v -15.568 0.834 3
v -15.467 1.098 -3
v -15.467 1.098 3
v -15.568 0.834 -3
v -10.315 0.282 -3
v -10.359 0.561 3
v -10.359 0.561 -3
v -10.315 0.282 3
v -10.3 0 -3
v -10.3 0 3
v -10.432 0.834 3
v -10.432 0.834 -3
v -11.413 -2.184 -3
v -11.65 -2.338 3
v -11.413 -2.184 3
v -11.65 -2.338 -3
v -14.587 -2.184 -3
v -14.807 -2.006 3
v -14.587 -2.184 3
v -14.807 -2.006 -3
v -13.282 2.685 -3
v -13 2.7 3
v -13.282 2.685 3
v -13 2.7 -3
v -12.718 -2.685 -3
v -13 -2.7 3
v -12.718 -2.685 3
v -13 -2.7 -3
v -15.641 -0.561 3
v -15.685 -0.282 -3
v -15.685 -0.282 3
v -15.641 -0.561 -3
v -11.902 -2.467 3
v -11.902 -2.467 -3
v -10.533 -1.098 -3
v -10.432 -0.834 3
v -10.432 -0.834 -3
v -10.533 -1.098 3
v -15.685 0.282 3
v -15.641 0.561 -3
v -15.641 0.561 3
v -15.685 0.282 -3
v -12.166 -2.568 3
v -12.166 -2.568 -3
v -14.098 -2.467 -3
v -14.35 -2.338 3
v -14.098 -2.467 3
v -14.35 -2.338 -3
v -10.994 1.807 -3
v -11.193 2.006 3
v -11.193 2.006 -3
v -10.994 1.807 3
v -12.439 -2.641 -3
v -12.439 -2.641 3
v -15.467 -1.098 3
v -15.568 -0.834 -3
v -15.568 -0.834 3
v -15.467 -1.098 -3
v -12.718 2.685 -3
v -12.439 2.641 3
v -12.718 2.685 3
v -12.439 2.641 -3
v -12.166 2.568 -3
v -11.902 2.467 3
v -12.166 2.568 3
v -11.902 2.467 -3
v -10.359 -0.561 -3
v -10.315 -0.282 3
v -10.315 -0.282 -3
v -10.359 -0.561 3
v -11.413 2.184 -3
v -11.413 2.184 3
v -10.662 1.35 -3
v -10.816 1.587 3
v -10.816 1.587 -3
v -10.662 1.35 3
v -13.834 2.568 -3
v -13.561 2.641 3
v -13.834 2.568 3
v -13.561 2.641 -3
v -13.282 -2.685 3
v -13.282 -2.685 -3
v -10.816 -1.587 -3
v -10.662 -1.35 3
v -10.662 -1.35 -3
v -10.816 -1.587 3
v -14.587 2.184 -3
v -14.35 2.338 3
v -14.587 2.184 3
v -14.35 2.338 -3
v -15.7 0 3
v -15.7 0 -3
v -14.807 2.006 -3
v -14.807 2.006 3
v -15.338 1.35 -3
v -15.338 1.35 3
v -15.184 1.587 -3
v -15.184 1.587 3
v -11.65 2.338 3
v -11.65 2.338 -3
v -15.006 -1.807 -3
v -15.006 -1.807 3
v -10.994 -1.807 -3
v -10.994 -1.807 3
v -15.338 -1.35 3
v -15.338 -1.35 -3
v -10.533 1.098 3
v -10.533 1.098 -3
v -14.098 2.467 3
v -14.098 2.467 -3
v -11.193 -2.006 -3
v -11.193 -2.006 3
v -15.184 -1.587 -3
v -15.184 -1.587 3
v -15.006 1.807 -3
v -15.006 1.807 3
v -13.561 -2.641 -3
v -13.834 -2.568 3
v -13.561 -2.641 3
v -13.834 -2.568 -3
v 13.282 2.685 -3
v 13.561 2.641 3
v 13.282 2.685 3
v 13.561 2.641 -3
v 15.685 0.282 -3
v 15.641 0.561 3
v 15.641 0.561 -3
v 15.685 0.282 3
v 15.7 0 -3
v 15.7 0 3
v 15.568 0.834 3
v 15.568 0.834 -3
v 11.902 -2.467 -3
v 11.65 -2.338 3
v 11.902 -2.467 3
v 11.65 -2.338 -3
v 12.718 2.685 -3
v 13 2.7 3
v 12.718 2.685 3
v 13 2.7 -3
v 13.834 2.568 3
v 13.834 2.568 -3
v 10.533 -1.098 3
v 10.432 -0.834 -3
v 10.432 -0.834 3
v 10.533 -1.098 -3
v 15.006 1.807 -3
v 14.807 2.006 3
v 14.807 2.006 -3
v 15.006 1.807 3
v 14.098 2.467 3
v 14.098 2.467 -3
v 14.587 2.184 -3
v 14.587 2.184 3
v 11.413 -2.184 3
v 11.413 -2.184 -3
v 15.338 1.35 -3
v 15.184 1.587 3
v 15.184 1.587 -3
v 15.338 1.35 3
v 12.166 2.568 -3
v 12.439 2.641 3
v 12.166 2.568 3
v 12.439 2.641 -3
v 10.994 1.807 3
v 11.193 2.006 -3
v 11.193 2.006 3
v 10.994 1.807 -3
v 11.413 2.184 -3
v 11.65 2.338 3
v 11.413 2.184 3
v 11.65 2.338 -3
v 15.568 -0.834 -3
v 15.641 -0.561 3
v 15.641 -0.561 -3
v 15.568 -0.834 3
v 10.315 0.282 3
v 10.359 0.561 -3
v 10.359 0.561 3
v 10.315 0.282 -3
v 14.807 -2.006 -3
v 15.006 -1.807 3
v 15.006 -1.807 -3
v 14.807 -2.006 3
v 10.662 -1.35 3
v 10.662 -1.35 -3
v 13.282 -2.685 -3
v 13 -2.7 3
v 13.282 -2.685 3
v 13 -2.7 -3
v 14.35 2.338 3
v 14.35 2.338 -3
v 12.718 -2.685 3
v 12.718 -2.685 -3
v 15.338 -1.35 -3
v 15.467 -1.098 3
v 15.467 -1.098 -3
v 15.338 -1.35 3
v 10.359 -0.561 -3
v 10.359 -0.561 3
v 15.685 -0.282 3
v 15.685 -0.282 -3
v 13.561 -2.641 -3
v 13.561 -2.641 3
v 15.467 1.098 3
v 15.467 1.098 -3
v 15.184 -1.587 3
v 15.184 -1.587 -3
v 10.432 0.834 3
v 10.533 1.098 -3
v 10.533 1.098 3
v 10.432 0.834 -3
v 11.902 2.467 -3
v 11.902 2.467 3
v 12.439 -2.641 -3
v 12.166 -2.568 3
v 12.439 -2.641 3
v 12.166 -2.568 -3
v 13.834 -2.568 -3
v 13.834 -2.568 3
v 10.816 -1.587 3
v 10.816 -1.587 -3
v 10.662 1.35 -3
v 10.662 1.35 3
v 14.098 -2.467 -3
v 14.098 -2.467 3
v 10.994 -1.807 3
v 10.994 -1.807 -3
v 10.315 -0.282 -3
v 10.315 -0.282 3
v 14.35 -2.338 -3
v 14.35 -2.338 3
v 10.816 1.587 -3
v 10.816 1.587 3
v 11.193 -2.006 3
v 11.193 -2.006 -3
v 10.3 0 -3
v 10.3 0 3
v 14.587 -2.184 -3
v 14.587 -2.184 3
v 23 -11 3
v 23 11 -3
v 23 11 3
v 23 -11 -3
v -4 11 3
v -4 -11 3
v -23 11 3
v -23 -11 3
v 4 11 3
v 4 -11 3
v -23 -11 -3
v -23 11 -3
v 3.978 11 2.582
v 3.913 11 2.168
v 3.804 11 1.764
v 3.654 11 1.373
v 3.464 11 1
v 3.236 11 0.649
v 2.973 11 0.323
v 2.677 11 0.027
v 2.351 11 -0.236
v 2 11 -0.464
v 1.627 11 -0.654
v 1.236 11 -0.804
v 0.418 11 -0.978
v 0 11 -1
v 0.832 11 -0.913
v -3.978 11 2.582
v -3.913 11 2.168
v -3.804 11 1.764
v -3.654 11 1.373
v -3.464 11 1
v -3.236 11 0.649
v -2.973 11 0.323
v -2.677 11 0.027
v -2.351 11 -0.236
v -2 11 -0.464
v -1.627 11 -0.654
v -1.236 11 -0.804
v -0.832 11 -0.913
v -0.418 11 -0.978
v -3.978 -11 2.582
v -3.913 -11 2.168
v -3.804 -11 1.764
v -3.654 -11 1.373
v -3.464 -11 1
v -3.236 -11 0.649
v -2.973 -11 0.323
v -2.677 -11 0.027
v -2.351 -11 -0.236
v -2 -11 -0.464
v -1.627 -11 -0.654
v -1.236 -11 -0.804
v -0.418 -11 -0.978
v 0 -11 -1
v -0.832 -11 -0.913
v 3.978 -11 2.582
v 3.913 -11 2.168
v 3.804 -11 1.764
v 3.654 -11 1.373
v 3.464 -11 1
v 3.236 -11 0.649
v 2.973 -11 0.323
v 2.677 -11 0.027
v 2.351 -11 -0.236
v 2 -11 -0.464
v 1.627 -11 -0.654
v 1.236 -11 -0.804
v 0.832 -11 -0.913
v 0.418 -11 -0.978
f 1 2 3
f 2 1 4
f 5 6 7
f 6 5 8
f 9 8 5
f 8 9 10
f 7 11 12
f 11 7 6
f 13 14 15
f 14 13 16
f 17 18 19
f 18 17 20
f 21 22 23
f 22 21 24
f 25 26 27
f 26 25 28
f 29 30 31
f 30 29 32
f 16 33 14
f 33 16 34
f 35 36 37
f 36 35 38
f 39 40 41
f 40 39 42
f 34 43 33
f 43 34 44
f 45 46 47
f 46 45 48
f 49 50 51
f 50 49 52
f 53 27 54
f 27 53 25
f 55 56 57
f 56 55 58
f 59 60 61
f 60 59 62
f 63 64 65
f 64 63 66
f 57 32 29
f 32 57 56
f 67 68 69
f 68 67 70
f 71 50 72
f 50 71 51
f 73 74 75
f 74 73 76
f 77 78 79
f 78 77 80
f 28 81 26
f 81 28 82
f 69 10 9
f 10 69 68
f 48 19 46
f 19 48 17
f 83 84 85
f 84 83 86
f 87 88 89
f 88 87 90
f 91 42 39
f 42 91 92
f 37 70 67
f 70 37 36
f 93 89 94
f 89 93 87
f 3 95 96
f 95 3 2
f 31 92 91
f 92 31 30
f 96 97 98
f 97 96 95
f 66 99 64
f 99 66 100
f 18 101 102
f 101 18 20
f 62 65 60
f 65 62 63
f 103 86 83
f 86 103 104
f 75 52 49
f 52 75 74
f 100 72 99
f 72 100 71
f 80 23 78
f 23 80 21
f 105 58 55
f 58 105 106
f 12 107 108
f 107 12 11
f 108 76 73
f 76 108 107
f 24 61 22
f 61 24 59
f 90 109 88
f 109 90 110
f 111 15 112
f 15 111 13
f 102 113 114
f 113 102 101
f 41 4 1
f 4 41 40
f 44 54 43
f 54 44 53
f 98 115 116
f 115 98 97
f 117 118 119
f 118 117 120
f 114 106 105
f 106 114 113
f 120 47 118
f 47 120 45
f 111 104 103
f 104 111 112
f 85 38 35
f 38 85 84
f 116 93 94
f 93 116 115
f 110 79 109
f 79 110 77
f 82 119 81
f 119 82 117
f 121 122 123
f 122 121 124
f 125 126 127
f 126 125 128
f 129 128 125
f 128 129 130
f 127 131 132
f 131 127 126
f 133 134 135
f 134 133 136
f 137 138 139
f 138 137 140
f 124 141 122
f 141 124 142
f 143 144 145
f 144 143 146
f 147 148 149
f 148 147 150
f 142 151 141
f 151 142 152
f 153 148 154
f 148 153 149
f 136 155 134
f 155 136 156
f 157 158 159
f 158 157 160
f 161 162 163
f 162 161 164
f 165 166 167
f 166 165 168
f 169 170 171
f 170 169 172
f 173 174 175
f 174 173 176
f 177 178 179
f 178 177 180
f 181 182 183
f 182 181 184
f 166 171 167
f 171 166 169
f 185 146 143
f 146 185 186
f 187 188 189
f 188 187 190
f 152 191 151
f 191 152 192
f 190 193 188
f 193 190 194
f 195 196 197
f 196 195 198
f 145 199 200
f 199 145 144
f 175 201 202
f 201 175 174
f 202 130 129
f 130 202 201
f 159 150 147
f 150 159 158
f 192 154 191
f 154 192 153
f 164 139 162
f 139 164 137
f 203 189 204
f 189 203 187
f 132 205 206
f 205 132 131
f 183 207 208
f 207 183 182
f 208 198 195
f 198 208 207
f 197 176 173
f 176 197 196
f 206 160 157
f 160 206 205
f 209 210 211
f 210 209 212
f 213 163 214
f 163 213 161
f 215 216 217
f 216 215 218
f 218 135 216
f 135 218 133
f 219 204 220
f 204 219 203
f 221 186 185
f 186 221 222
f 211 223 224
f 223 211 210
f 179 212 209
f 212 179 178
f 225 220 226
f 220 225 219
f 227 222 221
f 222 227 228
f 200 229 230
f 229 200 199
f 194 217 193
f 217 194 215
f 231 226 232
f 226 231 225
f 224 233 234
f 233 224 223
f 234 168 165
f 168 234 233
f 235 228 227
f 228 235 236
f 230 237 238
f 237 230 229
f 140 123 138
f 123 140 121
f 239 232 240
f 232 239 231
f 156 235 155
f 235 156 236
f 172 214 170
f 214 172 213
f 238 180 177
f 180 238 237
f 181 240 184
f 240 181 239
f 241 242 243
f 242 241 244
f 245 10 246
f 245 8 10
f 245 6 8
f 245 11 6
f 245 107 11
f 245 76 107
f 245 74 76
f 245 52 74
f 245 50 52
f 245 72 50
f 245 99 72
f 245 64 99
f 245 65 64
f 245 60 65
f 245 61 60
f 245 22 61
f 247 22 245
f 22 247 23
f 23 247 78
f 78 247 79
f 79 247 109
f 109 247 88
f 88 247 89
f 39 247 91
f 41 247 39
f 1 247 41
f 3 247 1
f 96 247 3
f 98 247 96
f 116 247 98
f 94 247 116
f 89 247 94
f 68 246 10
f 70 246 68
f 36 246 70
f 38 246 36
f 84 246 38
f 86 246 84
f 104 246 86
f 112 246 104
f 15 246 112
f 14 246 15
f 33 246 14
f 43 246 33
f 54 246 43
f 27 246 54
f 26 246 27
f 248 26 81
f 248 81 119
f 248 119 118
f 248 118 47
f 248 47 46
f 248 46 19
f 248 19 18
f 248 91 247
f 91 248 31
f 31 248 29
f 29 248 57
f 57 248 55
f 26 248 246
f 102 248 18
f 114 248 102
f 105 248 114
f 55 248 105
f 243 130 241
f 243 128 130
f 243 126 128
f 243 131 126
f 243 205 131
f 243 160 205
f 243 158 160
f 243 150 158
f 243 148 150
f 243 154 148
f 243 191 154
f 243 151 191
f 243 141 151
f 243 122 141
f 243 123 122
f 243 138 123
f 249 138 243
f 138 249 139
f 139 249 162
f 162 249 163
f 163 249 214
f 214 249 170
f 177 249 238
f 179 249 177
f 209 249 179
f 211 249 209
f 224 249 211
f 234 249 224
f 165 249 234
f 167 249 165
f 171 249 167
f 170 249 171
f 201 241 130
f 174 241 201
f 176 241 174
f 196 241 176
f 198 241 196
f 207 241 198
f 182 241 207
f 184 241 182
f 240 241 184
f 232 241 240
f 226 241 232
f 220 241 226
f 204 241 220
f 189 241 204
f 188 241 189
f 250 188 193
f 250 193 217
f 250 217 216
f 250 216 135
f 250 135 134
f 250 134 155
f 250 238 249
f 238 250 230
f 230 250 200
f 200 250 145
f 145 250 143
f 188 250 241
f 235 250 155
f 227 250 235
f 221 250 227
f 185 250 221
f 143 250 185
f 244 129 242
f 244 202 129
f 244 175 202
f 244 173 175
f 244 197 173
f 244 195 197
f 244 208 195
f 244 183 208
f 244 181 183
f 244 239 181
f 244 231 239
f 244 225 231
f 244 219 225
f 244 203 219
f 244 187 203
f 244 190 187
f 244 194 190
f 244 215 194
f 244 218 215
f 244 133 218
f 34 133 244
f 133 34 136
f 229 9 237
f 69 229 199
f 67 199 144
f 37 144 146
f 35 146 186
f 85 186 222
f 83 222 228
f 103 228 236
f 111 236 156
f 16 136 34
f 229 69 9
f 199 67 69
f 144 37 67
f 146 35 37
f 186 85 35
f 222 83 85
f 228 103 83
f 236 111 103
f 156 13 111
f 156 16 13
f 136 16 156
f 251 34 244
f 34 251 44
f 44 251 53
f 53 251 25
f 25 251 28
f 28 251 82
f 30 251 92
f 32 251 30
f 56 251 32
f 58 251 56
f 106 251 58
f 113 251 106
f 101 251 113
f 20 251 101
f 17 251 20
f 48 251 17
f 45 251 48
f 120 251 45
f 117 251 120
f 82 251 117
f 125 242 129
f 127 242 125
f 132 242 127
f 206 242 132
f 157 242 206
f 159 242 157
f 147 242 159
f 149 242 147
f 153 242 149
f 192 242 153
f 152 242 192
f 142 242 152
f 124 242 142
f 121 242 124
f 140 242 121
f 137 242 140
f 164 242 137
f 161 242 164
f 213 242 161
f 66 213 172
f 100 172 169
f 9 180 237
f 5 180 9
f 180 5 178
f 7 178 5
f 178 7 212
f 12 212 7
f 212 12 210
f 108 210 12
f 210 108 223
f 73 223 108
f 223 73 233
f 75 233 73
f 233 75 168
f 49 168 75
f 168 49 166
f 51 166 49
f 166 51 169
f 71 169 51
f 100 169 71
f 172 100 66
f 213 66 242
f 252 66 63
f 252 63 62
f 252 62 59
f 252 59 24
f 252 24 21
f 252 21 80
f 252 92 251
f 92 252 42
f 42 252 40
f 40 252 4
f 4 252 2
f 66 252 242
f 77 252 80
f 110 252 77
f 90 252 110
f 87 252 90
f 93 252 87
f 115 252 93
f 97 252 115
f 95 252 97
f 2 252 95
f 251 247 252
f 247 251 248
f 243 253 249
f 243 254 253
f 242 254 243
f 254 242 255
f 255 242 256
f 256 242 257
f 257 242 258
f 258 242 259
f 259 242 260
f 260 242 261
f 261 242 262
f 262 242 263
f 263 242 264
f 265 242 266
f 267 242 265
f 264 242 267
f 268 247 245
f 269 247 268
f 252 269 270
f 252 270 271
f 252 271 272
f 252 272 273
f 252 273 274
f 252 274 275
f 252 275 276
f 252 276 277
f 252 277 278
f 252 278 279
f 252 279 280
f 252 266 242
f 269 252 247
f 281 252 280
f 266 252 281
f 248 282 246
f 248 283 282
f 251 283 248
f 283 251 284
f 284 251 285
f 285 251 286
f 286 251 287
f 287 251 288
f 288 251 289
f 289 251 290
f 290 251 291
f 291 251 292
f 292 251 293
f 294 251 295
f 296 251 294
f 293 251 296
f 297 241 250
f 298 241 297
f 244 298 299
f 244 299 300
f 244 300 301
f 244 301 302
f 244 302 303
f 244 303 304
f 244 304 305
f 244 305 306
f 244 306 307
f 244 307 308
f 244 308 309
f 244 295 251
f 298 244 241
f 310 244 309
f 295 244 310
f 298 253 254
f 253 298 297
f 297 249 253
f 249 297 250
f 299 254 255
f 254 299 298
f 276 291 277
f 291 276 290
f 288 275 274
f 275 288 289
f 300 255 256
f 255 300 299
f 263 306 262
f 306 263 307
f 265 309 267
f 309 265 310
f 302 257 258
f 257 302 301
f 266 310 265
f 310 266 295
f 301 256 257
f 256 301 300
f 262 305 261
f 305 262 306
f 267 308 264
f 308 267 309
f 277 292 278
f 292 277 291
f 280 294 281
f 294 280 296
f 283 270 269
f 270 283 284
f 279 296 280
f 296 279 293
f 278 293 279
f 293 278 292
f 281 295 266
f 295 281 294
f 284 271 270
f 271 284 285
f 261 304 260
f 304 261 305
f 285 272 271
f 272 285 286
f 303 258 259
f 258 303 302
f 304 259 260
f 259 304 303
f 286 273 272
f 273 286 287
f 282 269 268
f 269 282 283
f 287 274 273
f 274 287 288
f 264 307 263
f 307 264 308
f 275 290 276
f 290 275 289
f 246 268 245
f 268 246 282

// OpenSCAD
// Saddle clamp base for round tube.
$fn = 60;
eps = 0.02;
pipe_d = 8;
base_l = 46;
base_w = 22;
base_t = 6;
difference() {
    cube([base_l,base_w,base_t],center=true);
    translate([0,-base_w/2-eps,base_t/2]) rotate([-90,0,0]) cylinder(d=pipe_d,h=base_w+2*eps);
    for (x=[-base_l/2+10,base_l/2-10]) translate([x,0,-base_t/2-eps]) cylinder(d=5.4,h=base_t+2*eps);
}
